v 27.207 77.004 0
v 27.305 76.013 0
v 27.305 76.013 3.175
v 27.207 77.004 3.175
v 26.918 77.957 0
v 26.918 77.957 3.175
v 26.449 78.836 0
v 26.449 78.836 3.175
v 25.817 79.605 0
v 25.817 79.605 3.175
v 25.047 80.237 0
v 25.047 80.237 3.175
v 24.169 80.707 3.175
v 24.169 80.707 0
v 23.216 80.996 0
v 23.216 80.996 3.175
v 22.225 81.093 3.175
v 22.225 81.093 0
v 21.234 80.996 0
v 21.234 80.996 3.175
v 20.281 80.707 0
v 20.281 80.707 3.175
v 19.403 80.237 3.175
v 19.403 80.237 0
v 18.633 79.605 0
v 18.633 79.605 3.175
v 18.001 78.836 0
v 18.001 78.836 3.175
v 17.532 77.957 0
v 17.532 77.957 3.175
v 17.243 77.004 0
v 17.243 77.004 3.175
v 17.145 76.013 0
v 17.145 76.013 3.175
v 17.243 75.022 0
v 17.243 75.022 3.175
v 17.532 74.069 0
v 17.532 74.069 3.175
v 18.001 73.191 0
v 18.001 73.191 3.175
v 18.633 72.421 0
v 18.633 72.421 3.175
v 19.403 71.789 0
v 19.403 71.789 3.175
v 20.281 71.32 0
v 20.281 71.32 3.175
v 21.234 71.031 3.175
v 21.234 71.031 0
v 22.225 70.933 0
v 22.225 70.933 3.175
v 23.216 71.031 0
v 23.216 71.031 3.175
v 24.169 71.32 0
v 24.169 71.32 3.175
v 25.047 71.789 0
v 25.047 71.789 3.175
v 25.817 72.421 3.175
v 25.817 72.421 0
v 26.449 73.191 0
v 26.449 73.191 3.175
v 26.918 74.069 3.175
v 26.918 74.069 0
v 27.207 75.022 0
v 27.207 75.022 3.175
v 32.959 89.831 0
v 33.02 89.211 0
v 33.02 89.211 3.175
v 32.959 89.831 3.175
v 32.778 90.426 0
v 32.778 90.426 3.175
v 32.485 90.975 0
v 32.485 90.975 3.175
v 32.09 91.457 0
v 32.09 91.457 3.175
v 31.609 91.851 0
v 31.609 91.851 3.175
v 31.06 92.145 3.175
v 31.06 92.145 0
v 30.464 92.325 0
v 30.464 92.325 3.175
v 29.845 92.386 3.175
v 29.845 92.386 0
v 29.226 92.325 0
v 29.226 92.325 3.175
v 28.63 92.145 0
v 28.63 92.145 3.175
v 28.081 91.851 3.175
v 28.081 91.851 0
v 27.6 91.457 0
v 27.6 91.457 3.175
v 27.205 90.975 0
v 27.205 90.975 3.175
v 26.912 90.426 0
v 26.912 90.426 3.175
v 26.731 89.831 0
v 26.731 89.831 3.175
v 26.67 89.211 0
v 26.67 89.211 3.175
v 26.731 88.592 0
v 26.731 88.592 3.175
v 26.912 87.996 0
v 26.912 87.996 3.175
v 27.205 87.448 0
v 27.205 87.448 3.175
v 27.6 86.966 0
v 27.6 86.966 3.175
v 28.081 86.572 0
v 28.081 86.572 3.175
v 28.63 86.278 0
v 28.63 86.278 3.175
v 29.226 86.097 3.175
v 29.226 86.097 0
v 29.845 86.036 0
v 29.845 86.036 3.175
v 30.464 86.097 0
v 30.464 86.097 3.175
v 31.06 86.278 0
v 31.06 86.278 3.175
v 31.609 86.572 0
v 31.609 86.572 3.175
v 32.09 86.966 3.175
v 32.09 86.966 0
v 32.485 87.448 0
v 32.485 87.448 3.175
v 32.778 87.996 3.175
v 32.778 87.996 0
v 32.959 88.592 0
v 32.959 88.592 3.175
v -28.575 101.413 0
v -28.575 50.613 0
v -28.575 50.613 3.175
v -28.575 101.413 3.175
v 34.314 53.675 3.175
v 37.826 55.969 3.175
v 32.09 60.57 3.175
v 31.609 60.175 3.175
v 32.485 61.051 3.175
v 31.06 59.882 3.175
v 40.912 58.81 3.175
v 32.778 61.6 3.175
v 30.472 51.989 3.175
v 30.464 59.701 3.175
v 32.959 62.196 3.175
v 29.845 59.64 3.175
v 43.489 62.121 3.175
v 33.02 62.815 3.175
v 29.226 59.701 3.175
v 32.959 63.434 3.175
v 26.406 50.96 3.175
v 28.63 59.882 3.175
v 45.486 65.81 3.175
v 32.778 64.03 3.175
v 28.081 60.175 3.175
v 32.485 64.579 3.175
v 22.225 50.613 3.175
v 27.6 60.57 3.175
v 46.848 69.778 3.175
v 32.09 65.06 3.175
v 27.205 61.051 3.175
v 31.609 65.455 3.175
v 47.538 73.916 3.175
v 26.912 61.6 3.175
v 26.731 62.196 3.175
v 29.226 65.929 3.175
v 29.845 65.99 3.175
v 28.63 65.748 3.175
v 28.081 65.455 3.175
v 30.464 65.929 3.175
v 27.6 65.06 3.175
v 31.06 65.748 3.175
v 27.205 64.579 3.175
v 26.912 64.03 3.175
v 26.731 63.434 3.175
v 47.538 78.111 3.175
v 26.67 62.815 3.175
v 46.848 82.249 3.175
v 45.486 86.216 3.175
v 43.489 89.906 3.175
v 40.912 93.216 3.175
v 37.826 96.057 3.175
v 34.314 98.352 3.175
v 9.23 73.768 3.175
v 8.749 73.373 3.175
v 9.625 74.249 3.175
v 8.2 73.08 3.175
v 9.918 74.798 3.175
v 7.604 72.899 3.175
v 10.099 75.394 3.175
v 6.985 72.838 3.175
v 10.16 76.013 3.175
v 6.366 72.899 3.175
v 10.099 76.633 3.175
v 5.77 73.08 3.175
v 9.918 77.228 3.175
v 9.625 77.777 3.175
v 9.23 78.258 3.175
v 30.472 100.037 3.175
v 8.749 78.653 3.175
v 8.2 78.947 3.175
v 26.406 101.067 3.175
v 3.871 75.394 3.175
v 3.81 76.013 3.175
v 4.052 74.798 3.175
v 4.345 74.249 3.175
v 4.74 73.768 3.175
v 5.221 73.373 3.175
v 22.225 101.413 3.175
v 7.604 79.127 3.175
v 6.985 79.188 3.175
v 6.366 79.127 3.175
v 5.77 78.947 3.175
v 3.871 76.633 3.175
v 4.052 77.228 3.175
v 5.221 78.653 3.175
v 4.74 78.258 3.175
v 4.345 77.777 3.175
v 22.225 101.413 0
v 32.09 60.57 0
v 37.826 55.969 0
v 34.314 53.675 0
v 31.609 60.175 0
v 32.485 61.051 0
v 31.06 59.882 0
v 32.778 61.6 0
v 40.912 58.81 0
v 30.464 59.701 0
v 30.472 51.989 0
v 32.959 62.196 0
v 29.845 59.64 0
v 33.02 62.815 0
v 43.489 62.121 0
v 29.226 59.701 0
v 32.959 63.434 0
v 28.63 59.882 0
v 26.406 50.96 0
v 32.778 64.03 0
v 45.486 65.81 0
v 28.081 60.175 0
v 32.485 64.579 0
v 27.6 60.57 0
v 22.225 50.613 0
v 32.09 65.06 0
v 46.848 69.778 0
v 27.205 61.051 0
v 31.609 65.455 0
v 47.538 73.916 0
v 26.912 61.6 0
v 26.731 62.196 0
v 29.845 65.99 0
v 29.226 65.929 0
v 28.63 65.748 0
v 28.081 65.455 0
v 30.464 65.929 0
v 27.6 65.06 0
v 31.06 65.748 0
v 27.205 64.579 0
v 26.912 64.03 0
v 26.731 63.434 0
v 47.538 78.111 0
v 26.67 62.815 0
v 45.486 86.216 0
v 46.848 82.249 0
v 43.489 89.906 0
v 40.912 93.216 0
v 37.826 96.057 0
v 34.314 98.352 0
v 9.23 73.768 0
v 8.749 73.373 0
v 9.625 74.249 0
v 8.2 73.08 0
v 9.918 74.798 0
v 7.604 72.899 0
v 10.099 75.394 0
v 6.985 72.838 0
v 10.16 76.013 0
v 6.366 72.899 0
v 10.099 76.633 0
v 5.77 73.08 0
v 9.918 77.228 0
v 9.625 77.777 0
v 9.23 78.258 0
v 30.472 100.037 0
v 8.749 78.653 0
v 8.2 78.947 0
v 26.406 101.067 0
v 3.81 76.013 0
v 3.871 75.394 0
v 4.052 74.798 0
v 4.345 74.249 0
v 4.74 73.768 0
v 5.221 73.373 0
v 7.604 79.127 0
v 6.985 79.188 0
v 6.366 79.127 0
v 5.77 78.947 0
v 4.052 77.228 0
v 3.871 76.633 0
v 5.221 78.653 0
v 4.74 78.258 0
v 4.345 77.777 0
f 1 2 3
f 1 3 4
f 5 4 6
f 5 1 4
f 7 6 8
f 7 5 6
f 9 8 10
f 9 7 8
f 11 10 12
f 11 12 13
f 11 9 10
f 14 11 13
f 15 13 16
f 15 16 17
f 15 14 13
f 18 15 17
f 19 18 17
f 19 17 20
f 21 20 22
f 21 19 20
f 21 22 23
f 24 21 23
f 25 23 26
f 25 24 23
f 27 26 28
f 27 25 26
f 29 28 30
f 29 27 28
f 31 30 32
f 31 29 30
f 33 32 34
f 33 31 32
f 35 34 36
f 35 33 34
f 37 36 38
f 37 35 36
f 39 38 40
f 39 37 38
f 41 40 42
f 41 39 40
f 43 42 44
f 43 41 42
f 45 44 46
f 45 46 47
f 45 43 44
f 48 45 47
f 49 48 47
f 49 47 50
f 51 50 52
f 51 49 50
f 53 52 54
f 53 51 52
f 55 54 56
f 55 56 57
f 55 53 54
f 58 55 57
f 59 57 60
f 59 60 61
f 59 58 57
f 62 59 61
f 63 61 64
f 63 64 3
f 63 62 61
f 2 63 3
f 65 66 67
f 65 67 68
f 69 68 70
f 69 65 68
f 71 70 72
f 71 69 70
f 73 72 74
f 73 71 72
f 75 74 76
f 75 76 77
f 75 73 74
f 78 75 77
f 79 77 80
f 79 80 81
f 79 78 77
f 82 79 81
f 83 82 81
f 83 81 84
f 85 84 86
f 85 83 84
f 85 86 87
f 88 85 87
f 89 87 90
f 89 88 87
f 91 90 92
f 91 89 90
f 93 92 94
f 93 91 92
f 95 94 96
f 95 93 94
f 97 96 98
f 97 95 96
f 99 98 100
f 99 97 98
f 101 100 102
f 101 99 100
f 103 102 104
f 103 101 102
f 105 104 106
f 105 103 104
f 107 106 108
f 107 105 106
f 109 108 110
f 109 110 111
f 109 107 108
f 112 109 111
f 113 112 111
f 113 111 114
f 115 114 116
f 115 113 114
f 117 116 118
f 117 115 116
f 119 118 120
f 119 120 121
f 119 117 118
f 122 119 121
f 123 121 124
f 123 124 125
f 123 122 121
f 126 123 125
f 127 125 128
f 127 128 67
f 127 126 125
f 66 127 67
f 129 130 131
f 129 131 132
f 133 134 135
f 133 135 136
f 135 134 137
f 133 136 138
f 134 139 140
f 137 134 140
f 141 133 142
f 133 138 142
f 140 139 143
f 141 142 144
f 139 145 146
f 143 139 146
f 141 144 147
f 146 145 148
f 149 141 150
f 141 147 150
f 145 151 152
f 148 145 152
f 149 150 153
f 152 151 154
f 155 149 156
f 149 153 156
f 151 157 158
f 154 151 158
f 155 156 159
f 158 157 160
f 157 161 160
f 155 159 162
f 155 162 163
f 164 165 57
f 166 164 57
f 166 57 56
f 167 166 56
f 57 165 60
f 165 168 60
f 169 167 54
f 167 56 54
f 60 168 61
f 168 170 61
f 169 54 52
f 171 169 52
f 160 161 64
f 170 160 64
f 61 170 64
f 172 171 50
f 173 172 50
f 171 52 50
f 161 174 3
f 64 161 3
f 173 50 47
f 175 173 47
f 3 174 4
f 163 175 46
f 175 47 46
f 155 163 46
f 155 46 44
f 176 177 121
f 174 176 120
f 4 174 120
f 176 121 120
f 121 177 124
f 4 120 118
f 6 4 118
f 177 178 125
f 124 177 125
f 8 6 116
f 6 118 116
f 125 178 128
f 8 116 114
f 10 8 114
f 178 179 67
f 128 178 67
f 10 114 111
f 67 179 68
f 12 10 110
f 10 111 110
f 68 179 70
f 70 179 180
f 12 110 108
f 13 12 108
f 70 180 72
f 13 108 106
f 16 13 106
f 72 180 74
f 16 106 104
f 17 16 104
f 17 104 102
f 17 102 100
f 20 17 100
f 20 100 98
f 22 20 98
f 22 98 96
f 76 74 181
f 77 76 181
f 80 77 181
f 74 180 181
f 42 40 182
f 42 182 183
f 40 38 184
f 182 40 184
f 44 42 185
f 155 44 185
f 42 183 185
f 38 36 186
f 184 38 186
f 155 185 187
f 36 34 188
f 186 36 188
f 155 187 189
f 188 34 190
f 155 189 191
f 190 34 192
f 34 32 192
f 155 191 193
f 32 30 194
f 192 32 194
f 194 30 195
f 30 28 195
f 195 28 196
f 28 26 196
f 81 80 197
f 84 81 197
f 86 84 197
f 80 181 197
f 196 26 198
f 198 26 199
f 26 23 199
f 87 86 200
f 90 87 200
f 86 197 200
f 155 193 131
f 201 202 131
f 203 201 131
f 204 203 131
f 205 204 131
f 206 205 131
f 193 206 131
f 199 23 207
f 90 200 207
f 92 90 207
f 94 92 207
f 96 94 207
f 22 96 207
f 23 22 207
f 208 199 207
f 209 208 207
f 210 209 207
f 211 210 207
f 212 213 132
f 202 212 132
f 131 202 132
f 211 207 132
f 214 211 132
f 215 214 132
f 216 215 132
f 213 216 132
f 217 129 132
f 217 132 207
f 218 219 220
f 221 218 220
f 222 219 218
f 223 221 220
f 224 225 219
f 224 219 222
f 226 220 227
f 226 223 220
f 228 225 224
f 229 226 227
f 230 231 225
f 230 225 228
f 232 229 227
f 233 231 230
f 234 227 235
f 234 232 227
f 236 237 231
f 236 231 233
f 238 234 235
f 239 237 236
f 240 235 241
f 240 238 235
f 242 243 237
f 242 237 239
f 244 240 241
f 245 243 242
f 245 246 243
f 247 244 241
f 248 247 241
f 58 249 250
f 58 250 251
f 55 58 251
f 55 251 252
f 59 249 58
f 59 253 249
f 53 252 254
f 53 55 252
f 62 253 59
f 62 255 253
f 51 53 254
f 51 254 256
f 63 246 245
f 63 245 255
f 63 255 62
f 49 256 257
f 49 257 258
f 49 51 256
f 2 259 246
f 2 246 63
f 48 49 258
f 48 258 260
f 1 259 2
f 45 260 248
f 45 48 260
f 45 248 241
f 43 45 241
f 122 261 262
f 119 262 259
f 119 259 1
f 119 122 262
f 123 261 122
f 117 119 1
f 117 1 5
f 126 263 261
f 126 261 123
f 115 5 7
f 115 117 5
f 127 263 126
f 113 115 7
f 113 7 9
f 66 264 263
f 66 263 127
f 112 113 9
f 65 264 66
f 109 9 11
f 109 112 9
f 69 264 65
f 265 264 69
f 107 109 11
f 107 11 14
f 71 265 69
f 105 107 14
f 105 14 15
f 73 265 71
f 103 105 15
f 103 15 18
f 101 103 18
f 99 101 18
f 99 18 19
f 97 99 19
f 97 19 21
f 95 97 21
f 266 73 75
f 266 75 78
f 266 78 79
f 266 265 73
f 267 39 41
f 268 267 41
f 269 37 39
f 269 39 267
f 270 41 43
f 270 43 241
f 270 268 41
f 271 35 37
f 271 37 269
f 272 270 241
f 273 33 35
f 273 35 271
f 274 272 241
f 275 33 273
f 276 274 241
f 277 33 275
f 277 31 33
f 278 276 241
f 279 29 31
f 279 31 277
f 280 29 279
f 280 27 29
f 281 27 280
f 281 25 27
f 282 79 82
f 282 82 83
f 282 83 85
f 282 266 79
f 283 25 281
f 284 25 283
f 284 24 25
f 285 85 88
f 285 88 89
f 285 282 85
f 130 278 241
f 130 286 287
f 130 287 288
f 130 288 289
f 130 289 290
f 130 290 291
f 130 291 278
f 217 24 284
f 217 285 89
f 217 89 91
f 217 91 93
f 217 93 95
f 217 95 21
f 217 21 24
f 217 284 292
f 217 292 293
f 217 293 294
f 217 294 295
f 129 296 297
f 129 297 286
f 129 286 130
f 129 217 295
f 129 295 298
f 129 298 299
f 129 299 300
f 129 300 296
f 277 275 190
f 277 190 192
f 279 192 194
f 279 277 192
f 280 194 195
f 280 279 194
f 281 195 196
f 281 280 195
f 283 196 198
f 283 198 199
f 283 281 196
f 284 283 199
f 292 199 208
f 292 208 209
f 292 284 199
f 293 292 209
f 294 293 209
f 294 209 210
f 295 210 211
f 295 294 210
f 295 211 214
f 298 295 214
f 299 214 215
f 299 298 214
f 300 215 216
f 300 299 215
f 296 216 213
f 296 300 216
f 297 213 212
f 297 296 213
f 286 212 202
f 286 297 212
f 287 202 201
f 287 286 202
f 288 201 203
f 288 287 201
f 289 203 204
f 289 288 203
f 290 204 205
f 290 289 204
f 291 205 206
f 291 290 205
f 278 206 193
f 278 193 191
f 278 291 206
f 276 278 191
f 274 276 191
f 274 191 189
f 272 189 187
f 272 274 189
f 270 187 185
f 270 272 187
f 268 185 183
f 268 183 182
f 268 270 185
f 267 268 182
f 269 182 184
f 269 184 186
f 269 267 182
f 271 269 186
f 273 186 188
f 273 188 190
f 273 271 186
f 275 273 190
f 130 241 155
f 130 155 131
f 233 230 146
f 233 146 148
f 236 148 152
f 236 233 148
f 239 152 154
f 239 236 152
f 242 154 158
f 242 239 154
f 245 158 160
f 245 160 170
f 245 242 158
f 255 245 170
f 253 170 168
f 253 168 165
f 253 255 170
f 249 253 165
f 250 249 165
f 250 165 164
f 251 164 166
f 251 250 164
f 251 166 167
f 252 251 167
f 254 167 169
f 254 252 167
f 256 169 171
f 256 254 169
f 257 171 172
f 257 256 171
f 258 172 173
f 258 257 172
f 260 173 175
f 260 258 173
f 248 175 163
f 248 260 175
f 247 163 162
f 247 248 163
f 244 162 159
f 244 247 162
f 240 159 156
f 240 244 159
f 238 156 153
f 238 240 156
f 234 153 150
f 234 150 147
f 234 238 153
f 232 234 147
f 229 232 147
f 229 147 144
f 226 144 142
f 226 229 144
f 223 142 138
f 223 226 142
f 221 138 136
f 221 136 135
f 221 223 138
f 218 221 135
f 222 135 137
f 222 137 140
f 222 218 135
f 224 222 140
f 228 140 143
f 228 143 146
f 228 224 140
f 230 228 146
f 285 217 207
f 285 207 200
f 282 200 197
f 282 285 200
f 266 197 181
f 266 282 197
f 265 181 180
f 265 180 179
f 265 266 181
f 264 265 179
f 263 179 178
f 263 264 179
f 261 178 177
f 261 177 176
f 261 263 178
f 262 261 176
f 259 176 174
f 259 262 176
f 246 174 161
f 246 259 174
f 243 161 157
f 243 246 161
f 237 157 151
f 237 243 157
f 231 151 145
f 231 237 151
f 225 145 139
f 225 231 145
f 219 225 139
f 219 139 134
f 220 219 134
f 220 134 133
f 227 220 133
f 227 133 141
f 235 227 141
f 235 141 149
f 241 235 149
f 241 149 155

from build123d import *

# Parameters (mm, degrees)
SKETCH1_R           = 5.08
SKETCH1_R_2         = 3.175
BOSS_EXTRUDE1_DEPTH = 3.175


with BuildPart() as part:
    # Sketch1 → Boss-Extrude1 (new body)
    with BuildSketch(Plane.XY):
        with BuildLine():
            Line((22.225, 50.613247917), (-28.575, 50.613247917))
            Line((-28.575, 50.613247917), (-28.575, 101.413247917))
            Line((-28.575, 101.413247917), (22.225, 101.413247917))
            ThreePointArc((22.225, 101.413247917), (47.625, 76.013247917), (22.225, 50.613247917))
        make_face()
        with Locations((22.225, 76.013247917)):
            Circle(SKETCH1_R, mode=Mode.SUBTRACT)
        with Locations((6.985, 76.013247917)):
            Circle(SKETCH1_R_2, mode=Mode.SUBTRACT)
        with Locations((29.845, 89.211475071)):
            Circle(SKETCH1_R_2, mode=Mode.SUBTRACT)
        with Locations((29.845, 62.815020764)):
            Circle(SKETCH1_R_2, mode=Mode.SUBTRACT)
    extrude(amount=BOSS_EXTRUDE1_DEPTH)


solid = part.part
